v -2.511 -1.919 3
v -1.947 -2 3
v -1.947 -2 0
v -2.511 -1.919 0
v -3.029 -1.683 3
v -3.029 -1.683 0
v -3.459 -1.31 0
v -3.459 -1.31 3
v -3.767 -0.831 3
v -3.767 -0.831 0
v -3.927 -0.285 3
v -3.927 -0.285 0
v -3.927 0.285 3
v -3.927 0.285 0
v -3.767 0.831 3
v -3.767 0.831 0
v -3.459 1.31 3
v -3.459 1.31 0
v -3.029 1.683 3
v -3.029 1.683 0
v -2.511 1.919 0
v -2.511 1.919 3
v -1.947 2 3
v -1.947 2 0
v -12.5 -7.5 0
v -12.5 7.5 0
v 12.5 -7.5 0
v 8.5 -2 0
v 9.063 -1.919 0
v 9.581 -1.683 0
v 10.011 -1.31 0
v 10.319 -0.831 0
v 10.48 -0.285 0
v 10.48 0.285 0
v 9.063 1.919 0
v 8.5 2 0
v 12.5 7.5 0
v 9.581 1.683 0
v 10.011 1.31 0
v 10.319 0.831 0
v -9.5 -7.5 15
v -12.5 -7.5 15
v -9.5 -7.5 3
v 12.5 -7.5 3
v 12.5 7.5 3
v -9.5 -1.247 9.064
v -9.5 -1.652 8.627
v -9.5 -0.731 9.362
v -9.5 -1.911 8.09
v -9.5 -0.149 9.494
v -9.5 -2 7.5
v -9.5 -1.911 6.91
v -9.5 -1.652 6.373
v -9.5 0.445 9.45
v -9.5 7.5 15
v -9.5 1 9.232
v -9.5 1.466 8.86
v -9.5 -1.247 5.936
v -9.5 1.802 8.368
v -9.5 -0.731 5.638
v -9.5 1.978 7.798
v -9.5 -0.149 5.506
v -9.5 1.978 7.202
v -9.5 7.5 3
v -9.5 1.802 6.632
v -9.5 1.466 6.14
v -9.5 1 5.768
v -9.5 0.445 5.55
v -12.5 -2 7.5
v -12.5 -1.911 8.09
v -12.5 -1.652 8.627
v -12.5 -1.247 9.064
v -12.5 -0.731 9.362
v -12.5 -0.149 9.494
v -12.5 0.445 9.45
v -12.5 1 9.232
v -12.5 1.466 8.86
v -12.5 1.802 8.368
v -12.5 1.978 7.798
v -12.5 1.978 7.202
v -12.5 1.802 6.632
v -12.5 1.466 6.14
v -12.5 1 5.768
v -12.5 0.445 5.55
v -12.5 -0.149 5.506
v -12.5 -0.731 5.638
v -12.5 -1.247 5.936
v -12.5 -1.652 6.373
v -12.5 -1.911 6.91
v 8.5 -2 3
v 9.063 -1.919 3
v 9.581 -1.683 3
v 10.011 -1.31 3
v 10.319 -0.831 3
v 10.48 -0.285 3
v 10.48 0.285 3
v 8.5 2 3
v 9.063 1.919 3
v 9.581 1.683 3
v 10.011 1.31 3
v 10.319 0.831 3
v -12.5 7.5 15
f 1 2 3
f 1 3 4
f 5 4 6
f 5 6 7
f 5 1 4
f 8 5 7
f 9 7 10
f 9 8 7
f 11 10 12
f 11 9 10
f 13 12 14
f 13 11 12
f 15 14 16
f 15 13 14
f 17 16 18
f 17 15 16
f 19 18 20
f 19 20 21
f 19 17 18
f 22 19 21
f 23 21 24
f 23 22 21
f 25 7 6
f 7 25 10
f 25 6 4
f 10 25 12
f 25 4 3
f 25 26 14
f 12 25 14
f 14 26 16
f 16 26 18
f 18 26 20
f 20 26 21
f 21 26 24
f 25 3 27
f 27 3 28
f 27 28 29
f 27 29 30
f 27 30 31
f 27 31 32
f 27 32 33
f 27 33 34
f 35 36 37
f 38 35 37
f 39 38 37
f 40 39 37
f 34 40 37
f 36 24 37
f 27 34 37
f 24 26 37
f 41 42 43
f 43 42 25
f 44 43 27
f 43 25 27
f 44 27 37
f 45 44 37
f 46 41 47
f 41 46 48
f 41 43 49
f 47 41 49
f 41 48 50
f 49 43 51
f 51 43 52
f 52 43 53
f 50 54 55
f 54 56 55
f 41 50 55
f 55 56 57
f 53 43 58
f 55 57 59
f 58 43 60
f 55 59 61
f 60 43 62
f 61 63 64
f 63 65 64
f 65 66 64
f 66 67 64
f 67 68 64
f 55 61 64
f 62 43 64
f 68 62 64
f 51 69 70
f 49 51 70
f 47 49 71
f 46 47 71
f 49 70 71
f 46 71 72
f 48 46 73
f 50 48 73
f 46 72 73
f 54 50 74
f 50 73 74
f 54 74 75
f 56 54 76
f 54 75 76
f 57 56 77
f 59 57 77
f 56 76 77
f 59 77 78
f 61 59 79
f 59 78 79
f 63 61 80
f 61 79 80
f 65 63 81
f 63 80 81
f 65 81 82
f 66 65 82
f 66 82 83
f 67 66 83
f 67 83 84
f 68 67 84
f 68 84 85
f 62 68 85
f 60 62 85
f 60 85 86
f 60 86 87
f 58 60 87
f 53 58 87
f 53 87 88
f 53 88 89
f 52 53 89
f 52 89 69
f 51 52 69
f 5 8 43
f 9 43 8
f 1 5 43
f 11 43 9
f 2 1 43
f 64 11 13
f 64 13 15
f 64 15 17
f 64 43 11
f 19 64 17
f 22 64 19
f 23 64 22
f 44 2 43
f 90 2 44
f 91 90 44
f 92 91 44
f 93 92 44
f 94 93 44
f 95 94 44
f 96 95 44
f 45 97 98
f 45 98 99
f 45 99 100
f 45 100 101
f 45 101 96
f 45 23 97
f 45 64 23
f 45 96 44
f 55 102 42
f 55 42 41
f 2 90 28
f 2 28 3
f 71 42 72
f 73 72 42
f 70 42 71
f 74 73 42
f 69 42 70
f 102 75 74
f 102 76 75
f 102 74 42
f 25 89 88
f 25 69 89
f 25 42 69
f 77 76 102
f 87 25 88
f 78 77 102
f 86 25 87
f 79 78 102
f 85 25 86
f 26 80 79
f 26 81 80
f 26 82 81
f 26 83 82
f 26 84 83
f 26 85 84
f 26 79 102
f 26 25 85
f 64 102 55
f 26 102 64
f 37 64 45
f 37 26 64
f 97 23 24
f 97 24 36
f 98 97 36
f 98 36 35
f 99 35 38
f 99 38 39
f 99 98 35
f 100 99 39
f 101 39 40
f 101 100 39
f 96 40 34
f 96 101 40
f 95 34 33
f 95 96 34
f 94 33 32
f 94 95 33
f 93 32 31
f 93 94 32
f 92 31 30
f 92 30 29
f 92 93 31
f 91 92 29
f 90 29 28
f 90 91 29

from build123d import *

# Parameters (mm, degrees)
SKETCH1_W           = 25
SKETCH1_H           = 15
BOSS_EXTRUDE1_DEPTH = 3
CUT_EXTRUDE1_DEPTH  = 3
SKETCH3_W           = 3
SKETCH3_H           = 15
BOSS_EXTRUDE2_DEPTH = 12
SKETCH4_R           = 2
CUT_EXTRUDE2_DEPTH  = 12


with BuildPart() as part:
    # Sketch1 → Boss-Extrude1 (new body)
    with BuildSketch(Plane.XY):
        Rectangle(SKETCH1_W, SKETCH1_H)
    extrude(amount=BOSS_EXTRUDE1_DEPTH)

    # Sketch2 → Cut-Extrude1 (cut)
    with BuildSketch(Plane.XY.offset(3)):
        with BuildLine():
            Line((8.5, -2), (-1.947413085, -2))
            ThreePointArc((-1.947413085, -2), (-3.947413085, 0), (-1.947413085, 2))
            Line((-1.947413085, 2), (8.5, 2))
            ThreePointArc((8.5, 2), (10.5, 0), (8.5, -2))
        make_face()
    extrude(amount=-CUT_EXTRUDE1_DEPTH, mode=Mode.SUBTRACT)

    # Sketch3 → Boss-Extrude2 (add)
    with BuildSketch(Plane.XY.offset(3)):
        with Locations((-11, 0)):
            Rectangle(SKETCH3_W, SKETCH3_H)
    extrude(amount=BOSS_EXTRUDE2_DEPTH)

    # Sketch4 → Cut-Extrude2 (cut)
    with BuildSketch(Plane.ZY.offset(12.5)):
        with Locations(Location((7.5, 0, 0), (0, 0, 270))):
            Circle(SKETCH4_R)
    extrude(amount=-CUT_EXTRUDE2_DEPTH, mode=Mode.SUBTRACT)


solid = part.part
